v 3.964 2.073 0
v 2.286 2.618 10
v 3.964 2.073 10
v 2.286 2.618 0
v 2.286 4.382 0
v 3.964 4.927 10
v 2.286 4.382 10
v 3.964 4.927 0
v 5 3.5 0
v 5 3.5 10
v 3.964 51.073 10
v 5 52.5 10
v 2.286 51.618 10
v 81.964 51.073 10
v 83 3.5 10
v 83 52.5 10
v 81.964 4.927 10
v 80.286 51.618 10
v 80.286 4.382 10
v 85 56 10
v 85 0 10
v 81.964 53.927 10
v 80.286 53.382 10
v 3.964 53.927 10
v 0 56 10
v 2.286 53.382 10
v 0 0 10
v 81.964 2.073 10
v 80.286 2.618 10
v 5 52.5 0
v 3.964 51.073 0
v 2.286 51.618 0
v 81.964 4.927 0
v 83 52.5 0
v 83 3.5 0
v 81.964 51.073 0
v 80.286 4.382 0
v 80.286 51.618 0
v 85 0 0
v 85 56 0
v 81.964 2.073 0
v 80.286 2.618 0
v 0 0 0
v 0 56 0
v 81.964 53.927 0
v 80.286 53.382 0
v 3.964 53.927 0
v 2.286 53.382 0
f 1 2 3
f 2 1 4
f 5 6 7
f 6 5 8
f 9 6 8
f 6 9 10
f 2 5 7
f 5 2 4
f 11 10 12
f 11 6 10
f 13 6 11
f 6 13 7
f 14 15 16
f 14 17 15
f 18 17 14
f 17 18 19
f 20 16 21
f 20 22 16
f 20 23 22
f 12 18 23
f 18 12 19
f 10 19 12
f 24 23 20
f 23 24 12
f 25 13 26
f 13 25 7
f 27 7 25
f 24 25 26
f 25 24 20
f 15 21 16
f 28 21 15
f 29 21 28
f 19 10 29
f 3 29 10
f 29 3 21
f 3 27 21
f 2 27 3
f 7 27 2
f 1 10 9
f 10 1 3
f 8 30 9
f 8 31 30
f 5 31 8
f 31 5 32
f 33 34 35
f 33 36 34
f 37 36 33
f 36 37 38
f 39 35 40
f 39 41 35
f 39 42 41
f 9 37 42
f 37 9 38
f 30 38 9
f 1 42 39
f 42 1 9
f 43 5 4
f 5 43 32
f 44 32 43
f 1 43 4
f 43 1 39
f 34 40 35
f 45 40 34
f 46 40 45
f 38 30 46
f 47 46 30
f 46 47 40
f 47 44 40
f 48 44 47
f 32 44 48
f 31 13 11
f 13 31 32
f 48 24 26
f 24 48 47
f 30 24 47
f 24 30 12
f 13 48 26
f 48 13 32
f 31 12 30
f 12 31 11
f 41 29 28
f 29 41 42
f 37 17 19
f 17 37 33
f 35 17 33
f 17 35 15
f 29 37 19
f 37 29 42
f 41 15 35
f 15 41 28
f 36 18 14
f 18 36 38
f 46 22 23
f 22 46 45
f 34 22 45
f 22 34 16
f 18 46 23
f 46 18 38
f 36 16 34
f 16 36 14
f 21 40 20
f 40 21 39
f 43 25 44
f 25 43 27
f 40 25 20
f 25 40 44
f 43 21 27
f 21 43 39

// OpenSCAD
// Modelo de pieza para Raspberry Pi 4
// Carcasa inferior

module base() {
    cube([85, 56, 10]);
}

module agujeros_tornillos() {
    translate([3.5, 3.5, 0]) cylinder(h=10, r=1.5);
    translate([3.5, 52.5, 0]) cylinder(h=10, r=1.5);
    translate([81.5, 3.5, 0]) cylinder(h=10, r=1.5);
    translate([81.5, 52.5, 0]) cylinder(h=10, r=1.5);
}

difference() {
    base();
    agujeros_tornillos();
}
